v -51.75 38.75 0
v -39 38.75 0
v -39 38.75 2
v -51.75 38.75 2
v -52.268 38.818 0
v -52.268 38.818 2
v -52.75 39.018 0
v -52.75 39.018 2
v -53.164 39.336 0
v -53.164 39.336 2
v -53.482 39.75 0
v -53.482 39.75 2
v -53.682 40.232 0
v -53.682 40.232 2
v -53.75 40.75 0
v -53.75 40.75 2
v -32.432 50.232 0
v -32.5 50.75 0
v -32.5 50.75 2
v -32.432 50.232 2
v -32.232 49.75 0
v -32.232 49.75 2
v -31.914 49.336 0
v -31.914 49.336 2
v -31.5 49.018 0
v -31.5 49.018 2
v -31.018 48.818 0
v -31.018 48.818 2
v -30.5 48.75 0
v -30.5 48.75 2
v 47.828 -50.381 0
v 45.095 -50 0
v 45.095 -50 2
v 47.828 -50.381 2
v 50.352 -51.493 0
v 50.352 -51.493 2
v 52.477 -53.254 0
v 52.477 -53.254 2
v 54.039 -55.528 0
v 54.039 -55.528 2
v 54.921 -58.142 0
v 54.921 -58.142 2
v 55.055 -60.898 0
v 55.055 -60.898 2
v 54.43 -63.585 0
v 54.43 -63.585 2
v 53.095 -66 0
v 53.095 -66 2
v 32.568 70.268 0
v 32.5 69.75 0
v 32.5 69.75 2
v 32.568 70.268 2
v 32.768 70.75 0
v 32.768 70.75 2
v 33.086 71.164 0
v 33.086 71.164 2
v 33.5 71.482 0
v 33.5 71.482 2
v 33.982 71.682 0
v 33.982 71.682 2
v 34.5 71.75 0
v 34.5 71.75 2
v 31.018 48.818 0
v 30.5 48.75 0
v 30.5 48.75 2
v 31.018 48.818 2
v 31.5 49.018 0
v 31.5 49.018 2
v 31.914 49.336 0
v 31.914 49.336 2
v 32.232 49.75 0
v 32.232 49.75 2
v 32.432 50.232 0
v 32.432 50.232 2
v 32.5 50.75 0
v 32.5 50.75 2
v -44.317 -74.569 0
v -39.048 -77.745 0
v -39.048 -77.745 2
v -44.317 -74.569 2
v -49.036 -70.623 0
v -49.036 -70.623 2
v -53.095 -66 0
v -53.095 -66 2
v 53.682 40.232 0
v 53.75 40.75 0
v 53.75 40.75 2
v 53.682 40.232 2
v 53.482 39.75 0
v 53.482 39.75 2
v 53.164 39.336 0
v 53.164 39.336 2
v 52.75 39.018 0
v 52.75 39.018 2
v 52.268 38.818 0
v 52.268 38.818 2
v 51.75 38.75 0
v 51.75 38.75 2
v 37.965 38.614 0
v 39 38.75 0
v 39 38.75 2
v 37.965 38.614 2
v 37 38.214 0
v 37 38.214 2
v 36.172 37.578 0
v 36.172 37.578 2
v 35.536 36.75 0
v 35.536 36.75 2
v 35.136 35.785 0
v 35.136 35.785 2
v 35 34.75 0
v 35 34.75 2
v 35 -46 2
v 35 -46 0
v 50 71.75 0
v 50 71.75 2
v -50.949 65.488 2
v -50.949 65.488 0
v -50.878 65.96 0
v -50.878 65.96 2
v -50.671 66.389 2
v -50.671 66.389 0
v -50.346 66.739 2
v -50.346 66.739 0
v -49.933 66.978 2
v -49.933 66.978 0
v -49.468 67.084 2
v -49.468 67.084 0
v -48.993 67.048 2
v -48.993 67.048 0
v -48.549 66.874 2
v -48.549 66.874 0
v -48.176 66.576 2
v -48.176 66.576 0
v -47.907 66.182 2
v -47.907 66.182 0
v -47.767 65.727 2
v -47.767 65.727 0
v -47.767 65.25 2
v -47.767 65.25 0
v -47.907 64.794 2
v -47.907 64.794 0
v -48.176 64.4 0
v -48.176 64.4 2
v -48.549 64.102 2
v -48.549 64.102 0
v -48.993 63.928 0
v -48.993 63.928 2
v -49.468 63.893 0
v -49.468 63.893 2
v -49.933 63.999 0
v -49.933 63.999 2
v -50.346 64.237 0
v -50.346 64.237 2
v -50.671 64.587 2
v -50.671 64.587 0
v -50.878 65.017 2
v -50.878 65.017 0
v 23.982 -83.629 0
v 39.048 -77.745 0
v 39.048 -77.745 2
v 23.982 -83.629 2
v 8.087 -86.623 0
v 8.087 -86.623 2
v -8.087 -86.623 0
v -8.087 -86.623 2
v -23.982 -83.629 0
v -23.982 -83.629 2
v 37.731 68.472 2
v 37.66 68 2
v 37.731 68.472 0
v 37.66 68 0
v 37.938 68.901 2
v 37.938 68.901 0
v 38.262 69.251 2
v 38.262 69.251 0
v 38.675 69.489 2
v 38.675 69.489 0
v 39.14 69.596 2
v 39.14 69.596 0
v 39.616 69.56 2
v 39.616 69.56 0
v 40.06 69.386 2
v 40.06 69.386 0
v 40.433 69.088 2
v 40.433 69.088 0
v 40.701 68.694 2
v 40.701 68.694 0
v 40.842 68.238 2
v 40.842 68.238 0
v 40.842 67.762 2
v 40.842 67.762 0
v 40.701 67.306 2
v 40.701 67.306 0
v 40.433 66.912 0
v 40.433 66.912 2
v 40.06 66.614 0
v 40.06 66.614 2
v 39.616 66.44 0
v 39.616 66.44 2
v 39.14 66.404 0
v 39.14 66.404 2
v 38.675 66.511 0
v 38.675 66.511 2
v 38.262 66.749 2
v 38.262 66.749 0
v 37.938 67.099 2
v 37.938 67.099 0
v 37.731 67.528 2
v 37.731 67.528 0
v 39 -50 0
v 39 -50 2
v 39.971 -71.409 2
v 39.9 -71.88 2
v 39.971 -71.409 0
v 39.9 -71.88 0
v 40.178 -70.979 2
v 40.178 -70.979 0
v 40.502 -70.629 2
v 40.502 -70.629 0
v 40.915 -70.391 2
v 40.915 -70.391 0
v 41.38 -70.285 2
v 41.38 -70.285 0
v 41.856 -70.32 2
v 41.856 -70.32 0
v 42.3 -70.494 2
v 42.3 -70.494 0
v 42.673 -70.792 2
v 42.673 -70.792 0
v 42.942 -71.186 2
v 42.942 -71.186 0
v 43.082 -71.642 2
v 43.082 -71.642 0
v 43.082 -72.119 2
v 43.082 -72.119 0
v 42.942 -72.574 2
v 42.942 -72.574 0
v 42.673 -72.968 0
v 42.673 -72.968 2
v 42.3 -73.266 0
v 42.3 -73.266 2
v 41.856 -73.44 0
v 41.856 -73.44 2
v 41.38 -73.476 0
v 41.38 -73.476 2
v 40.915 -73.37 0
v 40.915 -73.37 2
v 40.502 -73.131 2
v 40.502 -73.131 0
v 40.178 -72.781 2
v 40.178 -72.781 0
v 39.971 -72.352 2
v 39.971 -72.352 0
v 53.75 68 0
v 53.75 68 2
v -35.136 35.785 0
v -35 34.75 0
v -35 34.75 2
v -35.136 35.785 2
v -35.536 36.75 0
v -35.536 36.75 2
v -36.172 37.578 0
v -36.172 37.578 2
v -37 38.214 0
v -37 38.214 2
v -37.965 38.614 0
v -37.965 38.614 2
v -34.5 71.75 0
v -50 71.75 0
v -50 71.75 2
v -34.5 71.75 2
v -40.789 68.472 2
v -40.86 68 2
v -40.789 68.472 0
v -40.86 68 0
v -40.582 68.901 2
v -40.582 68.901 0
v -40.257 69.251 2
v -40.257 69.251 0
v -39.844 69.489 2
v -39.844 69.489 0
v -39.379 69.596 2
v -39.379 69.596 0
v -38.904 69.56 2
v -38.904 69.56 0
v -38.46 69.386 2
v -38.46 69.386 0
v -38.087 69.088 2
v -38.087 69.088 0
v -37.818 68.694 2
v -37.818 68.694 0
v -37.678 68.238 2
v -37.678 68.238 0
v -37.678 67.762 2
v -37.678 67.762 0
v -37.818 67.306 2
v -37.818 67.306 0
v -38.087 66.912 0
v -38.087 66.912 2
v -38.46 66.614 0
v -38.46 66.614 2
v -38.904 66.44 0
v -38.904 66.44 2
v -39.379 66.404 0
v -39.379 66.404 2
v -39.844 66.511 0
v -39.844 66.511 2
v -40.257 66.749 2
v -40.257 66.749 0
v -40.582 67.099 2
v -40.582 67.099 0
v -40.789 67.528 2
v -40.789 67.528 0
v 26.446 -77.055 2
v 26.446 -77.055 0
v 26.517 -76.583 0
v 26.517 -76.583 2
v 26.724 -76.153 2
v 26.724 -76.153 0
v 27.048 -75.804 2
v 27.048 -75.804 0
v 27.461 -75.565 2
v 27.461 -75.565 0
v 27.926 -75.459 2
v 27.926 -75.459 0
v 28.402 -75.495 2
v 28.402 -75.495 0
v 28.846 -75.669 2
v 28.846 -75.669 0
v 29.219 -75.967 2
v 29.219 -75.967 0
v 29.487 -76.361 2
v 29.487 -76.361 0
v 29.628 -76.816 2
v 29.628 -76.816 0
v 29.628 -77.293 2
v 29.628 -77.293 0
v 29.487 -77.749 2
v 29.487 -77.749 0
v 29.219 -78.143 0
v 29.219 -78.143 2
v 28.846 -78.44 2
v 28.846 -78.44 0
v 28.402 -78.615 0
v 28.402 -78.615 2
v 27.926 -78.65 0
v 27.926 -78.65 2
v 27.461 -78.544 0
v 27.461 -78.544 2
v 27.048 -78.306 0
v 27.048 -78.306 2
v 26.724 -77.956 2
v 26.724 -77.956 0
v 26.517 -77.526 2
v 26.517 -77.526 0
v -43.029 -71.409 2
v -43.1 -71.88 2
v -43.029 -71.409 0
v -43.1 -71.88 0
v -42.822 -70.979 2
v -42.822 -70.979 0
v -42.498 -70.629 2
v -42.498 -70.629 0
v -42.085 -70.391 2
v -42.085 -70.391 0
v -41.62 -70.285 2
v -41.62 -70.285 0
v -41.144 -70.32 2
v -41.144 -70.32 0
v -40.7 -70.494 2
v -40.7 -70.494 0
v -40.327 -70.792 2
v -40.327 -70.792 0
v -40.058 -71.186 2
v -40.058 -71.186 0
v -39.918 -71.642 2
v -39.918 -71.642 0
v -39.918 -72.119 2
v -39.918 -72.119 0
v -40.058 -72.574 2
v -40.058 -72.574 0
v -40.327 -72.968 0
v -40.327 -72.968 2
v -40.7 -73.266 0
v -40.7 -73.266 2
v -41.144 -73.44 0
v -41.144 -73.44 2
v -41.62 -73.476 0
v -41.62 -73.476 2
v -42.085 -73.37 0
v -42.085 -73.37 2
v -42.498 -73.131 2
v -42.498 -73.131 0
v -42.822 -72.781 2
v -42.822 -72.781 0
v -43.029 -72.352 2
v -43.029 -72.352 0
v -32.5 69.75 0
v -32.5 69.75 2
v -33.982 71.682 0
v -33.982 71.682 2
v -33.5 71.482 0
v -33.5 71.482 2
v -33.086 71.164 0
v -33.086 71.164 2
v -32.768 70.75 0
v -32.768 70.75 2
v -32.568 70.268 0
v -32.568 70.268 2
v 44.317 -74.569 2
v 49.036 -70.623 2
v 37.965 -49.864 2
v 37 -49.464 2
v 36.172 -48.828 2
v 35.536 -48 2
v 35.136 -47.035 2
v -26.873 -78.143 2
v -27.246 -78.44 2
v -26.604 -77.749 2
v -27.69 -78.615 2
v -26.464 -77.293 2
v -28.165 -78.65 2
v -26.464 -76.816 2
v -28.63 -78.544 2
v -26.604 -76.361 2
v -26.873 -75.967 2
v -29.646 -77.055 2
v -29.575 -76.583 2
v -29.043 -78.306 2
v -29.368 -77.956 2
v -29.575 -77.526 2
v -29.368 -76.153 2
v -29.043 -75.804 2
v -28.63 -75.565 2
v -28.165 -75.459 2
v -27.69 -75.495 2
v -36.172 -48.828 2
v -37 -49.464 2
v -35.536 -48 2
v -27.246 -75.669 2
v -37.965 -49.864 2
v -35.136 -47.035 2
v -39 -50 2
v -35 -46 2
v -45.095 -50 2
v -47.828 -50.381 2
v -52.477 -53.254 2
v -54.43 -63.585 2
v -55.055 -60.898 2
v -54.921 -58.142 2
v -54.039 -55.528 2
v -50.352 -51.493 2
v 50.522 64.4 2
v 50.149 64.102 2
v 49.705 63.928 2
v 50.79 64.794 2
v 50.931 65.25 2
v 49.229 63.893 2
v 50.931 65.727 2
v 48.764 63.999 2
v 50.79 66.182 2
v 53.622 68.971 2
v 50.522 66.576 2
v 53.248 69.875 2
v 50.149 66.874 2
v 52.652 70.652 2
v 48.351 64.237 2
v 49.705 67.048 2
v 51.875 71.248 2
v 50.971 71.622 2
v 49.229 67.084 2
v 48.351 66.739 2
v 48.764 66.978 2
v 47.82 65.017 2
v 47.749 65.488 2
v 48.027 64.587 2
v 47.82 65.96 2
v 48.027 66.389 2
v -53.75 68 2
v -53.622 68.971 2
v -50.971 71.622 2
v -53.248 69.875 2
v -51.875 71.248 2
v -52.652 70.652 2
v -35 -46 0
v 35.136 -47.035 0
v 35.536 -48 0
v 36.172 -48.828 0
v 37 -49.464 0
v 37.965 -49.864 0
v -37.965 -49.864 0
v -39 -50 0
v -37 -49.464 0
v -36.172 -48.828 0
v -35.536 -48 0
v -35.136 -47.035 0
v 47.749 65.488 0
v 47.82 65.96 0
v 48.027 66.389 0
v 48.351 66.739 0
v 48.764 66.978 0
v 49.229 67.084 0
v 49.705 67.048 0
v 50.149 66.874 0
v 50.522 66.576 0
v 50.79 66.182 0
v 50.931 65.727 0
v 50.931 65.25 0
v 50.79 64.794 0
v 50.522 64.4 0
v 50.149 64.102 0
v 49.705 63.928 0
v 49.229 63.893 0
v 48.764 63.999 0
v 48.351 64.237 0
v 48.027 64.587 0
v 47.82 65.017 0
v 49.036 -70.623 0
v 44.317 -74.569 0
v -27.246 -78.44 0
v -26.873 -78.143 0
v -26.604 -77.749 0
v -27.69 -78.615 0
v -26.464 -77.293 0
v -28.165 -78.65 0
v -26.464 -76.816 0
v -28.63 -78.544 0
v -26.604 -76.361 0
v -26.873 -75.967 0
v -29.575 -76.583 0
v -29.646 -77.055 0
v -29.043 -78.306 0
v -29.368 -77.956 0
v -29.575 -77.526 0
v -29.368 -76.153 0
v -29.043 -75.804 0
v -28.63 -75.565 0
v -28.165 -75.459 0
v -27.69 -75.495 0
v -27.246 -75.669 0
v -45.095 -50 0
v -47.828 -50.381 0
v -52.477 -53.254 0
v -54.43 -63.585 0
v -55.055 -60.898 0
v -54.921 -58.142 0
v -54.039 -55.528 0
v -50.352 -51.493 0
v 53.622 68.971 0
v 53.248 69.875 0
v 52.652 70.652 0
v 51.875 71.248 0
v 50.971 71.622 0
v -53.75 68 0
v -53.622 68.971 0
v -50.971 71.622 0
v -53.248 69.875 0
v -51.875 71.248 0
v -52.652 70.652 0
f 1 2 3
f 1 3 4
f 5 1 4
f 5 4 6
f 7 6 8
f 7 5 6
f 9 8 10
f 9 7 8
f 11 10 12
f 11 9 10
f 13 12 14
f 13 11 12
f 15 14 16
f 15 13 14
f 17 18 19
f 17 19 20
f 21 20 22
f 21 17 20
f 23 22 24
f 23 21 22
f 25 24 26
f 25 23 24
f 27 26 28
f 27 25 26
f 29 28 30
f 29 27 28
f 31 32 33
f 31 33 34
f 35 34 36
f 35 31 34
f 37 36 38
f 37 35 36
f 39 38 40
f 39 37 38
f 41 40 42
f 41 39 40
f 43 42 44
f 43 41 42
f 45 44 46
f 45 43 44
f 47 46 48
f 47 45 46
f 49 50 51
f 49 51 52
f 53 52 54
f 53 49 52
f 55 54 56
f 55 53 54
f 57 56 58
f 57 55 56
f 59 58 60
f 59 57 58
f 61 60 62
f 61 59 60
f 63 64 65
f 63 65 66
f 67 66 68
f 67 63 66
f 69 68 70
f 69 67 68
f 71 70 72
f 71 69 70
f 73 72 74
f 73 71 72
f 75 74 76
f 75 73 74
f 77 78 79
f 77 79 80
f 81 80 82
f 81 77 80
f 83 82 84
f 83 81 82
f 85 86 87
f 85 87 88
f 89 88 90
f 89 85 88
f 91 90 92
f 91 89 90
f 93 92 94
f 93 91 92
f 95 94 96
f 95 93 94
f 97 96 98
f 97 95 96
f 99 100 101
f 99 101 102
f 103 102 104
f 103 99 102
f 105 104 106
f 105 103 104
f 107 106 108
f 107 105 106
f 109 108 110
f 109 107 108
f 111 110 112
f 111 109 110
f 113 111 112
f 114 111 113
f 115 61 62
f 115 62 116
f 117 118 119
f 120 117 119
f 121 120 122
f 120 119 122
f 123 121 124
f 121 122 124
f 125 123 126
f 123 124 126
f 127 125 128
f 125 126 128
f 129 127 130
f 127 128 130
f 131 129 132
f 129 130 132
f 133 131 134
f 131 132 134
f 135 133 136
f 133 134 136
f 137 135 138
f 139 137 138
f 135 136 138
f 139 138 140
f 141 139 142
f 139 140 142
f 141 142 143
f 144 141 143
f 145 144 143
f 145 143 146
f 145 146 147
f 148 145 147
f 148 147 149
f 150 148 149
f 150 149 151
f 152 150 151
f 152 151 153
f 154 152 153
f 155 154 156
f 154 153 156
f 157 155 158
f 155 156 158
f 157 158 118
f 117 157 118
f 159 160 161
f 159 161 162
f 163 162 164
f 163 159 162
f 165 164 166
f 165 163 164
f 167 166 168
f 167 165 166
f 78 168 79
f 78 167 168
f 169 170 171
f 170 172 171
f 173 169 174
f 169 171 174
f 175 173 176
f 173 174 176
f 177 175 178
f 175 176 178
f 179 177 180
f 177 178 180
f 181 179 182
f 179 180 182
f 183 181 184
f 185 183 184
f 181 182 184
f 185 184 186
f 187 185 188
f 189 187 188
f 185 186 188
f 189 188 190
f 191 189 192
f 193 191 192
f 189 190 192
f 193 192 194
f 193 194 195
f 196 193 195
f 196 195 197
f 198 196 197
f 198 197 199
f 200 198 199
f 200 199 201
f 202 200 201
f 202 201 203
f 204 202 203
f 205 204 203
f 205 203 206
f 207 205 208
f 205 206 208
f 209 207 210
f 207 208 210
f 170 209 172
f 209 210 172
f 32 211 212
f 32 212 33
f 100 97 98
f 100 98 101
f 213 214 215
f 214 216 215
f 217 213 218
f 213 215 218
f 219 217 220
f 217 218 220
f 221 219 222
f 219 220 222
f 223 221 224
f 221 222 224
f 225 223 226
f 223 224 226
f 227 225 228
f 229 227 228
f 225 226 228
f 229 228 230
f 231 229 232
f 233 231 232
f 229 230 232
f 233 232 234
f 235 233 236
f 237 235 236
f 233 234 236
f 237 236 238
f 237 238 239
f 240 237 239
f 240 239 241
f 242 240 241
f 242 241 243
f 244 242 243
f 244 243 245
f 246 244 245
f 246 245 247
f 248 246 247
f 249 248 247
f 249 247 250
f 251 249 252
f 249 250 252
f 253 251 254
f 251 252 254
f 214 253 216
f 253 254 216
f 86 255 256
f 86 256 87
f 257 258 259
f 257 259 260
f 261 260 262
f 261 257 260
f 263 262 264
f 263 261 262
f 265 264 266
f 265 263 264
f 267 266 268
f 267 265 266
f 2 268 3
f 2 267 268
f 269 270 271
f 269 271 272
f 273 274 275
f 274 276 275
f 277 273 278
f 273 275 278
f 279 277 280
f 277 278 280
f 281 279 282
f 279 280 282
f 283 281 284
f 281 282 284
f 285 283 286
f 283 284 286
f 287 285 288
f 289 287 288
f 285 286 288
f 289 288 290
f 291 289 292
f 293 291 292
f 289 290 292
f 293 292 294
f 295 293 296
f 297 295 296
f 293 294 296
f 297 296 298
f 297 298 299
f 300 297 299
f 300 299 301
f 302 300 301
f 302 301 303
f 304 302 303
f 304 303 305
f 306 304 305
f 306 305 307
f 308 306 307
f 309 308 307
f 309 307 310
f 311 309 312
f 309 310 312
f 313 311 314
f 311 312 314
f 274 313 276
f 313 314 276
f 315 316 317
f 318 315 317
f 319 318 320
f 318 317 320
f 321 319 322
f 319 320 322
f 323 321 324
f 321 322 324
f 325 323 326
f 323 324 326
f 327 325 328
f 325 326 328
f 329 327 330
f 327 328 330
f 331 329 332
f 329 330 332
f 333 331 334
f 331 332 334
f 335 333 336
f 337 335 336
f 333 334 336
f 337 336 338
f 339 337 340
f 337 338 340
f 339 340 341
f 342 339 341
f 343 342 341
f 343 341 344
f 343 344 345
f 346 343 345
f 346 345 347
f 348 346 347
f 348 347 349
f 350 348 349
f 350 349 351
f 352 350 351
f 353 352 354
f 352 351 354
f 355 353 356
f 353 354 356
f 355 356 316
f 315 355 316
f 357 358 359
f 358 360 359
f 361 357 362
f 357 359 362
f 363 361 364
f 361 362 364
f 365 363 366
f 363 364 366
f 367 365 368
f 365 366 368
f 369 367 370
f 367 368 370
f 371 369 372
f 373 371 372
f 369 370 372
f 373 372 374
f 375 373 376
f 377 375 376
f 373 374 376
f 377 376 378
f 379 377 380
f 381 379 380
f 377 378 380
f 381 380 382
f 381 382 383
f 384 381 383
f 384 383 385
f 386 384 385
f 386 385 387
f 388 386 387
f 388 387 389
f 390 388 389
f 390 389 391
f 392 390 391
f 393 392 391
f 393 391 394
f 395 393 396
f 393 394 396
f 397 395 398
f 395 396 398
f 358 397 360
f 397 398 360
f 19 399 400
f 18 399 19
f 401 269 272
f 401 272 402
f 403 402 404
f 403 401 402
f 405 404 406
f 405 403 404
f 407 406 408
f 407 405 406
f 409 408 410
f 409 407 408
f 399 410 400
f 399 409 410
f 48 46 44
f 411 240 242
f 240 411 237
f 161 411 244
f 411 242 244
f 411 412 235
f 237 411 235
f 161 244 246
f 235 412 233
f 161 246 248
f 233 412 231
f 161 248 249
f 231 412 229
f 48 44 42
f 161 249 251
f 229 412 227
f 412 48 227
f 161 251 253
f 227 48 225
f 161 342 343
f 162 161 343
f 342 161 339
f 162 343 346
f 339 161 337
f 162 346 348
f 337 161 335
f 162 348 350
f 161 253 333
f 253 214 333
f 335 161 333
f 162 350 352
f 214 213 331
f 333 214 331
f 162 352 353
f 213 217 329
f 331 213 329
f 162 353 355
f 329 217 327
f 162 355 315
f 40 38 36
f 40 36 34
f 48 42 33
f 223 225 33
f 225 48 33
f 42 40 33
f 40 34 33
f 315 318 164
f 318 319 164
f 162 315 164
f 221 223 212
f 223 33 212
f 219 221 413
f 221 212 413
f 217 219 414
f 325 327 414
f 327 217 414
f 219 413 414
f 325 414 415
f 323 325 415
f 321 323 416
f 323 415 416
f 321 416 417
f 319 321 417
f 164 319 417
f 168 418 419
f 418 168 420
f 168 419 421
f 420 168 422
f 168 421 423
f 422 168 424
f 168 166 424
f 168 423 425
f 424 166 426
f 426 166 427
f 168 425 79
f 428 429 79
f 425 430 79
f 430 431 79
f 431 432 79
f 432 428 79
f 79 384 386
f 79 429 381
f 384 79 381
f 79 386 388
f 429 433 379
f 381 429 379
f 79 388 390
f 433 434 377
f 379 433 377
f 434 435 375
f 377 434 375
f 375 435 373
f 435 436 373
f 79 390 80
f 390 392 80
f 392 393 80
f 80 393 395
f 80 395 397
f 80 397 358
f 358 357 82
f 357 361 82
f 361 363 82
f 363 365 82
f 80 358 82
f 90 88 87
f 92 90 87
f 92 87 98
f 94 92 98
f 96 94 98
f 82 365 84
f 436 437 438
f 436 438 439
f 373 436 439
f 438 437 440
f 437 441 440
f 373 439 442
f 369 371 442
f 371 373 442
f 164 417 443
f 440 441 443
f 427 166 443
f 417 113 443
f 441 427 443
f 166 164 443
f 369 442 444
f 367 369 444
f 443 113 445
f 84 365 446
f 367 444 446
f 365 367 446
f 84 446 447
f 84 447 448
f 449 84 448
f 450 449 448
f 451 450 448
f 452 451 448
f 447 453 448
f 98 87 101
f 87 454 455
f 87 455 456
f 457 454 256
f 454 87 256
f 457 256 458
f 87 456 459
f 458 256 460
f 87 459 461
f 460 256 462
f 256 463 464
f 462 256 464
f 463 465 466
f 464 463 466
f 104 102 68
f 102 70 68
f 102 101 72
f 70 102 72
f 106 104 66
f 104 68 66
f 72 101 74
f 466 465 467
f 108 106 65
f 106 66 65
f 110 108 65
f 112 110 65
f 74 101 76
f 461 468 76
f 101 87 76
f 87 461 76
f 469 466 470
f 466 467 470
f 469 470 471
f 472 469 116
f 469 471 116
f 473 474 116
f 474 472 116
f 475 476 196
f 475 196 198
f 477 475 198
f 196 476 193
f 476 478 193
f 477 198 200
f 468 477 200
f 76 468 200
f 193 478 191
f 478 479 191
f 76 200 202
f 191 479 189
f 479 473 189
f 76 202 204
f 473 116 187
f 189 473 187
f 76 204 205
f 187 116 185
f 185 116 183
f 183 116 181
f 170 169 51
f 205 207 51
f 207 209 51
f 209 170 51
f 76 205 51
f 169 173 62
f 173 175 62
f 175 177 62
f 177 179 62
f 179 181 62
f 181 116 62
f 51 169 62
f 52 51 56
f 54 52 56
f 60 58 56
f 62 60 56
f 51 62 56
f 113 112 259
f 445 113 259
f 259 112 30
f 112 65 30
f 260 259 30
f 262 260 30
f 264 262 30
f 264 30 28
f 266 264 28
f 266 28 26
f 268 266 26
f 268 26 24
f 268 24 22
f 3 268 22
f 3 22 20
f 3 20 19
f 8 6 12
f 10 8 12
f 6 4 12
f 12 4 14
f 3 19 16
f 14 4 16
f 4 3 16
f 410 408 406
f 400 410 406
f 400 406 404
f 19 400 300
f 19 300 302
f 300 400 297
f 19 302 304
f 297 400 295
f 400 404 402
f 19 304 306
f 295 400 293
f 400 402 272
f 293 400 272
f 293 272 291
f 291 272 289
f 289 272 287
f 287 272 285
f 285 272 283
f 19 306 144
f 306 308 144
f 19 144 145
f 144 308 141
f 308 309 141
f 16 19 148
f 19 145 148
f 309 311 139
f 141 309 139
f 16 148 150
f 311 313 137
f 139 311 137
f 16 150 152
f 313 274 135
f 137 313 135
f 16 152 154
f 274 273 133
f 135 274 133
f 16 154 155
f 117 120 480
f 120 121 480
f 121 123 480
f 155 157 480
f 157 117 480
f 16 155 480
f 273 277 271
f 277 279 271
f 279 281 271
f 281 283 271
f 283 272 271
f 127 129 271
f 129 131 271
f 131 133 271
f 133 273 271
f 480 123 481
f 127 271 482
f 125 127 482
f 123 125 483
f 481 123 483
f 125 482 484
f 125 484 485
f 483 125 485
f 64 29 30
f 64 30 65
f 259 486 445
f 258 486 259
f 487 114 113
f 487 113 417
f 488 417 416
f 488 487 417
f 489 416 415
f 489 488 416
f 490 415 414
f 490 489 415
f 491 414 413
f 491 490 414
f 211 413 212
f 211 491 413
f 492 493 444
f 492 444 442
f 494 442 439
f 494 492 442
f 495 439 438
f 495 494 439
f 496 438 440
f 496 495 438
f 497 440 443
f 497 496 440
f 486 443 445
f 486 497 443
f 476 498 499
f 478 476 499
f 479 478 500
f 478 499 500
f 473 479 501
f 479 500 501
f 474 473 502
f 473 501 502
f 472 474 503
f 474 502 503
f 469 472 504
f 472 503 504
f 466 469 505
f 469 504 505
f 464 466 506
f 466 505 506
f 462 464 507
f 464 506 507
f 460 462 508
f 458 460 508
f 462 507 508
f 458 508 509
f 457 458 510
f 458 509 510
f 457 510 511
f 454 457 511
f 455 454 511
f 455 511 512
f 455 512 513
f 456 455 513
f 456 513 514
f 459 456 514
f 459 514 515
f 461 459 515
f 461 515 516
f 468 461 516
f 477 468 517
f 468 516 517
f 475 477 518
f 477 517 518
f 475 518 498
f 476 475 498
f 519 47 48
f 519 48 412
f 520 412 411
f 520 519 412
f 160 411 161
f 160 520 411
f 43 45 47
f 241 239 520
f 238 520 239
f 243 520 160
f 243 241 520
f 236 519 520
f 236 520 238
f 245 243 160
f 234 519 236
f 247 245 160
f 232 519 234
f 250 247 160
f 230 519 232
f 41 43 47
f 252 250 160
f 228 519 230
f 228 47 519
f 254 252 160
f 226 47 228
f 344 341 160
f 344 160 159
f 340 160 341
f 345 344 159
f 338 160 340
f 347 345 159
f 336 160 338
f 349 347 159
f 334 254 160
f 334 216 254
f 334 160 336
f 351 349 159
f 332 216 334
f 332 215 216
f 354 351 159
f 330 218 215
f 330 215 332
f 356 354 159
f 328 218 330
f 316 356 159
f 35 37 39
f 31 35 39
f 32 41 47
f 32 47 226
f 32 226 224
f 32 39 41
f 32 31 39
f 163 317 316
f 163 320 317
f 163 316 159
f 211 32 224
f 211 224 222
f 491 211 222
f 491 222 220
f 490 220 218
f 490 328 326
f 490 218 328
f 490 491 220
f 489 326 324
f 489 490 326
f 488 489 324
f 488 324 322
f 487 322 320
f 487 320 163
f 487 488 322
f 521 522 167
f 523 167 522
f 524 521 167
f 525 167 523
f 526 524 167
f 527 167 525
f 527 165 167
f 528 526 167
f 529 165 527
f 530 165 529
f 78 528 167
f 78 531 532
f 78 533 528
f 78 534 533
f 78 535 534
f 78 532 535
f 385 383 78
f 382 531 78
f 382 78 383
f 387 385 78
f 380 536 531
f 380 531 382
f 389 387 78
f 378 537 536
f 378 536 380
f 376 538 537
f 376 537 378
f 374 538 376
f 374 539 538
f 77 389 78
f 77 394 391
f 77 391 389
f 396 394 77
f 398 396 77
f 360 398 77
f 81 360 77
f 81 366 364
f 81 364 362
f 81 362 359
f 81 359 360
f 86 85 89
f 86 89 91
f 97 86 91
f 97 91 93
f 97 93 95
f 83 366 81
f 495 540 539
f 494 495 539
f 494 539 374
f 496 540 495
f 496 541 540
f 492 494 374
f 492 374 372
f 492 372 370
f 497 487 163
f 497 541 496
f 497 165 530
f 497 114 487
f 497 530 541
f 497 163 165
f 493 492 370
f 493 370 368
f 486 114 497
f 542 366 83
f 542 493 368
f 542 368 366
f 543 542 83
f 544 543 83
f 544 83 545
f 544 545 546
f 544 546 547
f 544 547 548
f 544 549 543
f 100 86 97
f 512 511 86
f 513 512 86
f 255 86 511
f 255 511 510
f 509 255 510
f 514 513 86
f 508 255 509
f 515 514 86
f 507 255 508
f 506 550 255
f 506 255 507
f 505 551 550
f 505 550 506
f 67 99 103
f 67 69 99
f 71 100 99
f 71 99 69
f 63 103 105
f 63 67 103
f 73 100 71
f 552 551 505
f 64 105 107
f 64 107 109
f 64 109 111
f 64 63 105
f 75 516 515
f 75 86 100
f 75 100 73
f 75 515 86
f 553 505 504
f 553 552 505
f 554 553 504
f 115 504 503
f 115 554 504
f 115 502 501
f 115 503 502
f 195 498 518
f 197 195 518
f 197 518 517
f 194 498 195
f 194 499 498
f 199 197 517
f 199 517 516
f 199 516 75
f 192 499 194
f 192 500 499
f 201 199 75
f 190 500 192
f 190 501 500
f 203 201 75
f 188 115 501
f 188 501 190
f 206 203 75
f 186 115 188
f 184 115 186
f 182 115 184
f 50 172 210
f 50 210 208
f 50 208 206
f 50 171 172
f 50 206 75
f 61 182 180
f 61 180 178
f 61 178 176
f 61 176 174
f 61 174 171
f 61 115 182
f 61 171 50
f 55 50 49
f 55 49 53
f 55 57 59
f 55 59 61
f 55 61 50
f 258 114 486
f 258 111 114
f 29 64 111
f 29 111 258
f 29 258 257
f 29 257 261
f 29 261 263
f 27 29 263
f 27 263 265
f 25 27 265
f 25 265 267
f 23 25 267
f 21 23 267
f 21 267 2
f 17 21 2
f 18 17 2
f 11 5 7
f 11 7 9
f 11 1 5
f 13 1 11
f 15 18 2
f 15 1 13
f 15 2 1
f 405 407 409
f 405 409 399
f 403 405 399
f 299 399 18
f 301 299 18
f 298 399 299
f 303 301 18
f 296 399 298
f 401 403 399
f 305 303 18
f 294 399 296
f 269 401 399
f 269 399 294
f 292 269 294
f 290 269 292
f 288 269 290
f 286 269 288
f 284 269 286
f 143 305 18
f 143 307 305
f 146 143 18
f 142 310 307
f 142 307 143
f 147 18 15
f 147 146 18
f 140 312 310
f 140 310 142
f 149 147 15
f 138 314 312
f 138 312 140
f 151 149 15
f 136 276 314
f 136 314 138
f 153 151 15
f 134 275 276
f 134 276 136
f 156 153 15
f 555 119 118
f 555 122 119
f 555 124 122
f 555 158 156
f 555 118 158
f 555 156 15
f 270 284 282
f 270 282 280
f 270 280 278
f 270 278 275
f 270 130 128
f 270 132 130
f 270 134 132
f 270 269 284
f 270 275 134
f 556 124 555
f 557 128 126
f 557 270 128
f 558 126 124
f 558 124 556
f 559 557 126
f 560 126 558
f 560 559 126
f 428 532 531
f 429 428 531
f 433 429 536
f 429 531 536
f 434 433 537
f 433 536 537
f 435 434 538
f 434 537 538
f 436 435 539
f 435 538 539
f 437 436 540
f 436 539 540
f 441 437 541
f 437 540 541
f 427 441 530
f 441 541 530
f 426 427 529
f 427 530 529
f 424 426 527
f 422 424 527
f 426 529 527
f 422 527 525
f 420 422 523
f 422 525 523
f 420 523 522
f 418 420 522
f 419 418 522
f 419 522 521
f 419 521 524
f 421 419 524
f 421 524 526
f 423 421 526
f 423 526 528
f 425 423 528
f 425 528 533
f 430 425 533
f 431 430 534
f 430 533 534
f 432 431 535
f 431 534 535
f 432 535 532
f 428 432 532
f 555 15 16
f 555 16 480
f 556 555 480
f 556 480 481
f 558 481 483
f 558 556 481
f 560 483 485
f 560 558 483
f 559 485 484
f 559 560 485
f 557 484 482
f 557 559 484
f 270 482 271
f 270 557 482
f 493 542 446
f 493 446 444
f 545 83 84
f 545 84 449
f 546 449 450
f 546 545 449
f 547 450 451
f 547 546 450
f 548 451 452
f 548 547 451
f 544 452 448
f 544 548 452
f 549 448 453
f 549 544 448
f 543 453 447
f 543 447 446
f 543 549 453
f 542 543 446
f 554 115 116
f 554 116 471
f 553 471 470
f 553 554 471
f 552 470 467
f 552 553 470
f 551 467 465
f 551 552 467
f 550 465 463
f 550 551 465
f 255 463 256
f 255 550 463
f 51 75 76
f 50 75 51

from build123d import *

# Parameters (mm, degrees)
SKETCH1_R                = 1.6
BOSS_EXTRUDE1_DEPTH      = 2
M3_CLEARANCE_HOLE1_D     = 3.2
M3_CLEARANCE_HOLE1_DEPTH = 2
M3_CLEARANCE_HOLE1_TIP   = 0.96137699


with BuildPart() as part:
    # Sketch1 → Boss-Extrude1 (new body)
    with BuildSketch(Plane(origin=(0, 0, 0), x_dir=(-1, 0, 0), z_dir=(0, 0, -1))):
        with BuildLine():
            Line((49.999999993, 71.749999992), (34.499999968, 71.749999992))
            ThreePointArc((34.499999968, 71.749999992), (33.085786407, 71.164213555), (32.49999997, 69.749999994))
            Line((32.49999997, 69.749999994), (32.49999997, 50.749999994))
            ThreePointArc((32.49999997, 50.749999994), (31.914213535, 49.335786439), (30.49999998, 48.750000004))
            Line((30.49999998, 48.750000004), (-30.50000002, 48.750000004))
            ThreePointArc((-30.50000002, 48.750000004), (-31.914213575, 49.335786439), (-32.50000001, 50.749999994))
            Line((-32.50000001, 50.749999994), (-32.50000001, 69.749999994))
            ThreePointArc((-32.50000001, 69.749999994), (-33.085786447, 71.164213555), (-34.500000007, 71.749999992))
            Line((-34.500000007, 71.749999992), (-50.000000007, 71.749999992))
            ThreePointArc((-50.000000007, 71.749999992), (-52.651650433, 70.651650422), (-53.750000002, 67.999999996))
            Line((-53.750000002, 67.999999996), (-53.750000002, 40.749999996))
            ThreePointArc((-53.750000002, 40.749999996), (-53.164213571, 39.335786449), (-51.750000024, 38.750000018))
            Line((-51.750000024, 38.750000018), (-39.000000024, 38.750000018))
            ThreePointArc((-39.000000024, 38.750000018), (-36.171572886, 37.578427137), (-35.000000005, 34.75))
            Line((-35.000000005, 34.75), (-35.000000005, -46))
            ThreePointArc((-35.000000005, -46), (-36.171572879, -48.828427121), (-38.999999999, -49.999999994))
            Line((-38.999999999, -49.999999994), (-45.09502308, -49.999999994))
            ThreePointArc((-45.09502308, -49.999999994), (-54.039294999, -55.527864046), (-53.095023084, -66.000000011))
            ThreePointArc((-53.095023084, -66.000000011), (-46.752677079, -72.686883058), (-39.048234252, -77.744680848))
            ThreePointArc((-39.048234252, -77.744680848), (1.5e-08, -86.999999997), (39.048234283, -77.744680848))
            ThreePointArc((39.048234283, -77.744680848), (46.752677109, -72.686883058), (53.095023115, -66.000000011))
            ThreePointArc((53.095023115, -66.000000011), (54.039295029, -55.527864046), (45.095023111, -49.999999994))
            Line((45.095023111, -49.999999994), (39.000000001, -49.999999994))
            ThreePointArc((39.000000001, -49.999999994), (36.17157288, -48.828427121), (35.000000007, -46))
            Line((35.000000007, -46), (35.000000007, 34.75))
            ThreePointArc((35.000000007, 34.75), (36.171572888, 37.578427137), (39.000000025, 38.750000018))
            Line((39.000000025, 38.750000018), (51.750000009, 38.750000018))
            ThreePointArc((51.750000009, 38.750000018), (53.164213556, 39.335786449), (53.749999988, 40.749999996))
            Line((53.749999988, 40.749999996), (53.749999988, 67.999999996))
            ThreePointArc((53.749999988, 67.999999996), (52.651650419, 70.651650422), (49.999999993, 71.749999992))
        make_face()
        with Locations((49.348831914, 65.488111827)):
            Circle(SKETCH1_R, mode=Mode.SUBTRACT)
        with Locations((-49.348831883, 65.488111827)):
            Circle(SKETCH1_R, mode=Mode.SUBTRACT)
        with Locations((28.045651768, -77.054794901)):
            Circle(SKETCH1_R, mode=Mode.SUBTRACT)
        with Locations((-28.045651737, -77.054794901)):
            Circle(SKETCH1_R, mode=Mode.SUBTRACT)
    extrude(amount=-BOSS_EXTRUDE1_DEPTH)

    # M3 Clearance Hole1
    with Locations(Plane(origin=(-39.259818305, 68, 2), x_dir=(1, 0, 0), z_dir=(0, 0, 1))):
        with Locations((0, 0), (78.51963661, 0), (80.759818305, -139.880108514), (-2.240181695, -139.880108514)):
            Hole(M3_CLEARANCE_HOLE1_D / 2, depth=M3_CLEARANCE_HOLE1_DEPTH)
            with Locations((0, 0, -(M3_CLEARANCE_HOLE1_DEPTH + M3_CLEARANCE_HOLE1_TIP / 2))):  # 118° drill point
                Cone(0, M3_CLEARANCE_HOLE1_D / 2, M3_CLEARANCE_HOLE1_TIP, mode=Mode.SUBTRACT)


solid = part.part
